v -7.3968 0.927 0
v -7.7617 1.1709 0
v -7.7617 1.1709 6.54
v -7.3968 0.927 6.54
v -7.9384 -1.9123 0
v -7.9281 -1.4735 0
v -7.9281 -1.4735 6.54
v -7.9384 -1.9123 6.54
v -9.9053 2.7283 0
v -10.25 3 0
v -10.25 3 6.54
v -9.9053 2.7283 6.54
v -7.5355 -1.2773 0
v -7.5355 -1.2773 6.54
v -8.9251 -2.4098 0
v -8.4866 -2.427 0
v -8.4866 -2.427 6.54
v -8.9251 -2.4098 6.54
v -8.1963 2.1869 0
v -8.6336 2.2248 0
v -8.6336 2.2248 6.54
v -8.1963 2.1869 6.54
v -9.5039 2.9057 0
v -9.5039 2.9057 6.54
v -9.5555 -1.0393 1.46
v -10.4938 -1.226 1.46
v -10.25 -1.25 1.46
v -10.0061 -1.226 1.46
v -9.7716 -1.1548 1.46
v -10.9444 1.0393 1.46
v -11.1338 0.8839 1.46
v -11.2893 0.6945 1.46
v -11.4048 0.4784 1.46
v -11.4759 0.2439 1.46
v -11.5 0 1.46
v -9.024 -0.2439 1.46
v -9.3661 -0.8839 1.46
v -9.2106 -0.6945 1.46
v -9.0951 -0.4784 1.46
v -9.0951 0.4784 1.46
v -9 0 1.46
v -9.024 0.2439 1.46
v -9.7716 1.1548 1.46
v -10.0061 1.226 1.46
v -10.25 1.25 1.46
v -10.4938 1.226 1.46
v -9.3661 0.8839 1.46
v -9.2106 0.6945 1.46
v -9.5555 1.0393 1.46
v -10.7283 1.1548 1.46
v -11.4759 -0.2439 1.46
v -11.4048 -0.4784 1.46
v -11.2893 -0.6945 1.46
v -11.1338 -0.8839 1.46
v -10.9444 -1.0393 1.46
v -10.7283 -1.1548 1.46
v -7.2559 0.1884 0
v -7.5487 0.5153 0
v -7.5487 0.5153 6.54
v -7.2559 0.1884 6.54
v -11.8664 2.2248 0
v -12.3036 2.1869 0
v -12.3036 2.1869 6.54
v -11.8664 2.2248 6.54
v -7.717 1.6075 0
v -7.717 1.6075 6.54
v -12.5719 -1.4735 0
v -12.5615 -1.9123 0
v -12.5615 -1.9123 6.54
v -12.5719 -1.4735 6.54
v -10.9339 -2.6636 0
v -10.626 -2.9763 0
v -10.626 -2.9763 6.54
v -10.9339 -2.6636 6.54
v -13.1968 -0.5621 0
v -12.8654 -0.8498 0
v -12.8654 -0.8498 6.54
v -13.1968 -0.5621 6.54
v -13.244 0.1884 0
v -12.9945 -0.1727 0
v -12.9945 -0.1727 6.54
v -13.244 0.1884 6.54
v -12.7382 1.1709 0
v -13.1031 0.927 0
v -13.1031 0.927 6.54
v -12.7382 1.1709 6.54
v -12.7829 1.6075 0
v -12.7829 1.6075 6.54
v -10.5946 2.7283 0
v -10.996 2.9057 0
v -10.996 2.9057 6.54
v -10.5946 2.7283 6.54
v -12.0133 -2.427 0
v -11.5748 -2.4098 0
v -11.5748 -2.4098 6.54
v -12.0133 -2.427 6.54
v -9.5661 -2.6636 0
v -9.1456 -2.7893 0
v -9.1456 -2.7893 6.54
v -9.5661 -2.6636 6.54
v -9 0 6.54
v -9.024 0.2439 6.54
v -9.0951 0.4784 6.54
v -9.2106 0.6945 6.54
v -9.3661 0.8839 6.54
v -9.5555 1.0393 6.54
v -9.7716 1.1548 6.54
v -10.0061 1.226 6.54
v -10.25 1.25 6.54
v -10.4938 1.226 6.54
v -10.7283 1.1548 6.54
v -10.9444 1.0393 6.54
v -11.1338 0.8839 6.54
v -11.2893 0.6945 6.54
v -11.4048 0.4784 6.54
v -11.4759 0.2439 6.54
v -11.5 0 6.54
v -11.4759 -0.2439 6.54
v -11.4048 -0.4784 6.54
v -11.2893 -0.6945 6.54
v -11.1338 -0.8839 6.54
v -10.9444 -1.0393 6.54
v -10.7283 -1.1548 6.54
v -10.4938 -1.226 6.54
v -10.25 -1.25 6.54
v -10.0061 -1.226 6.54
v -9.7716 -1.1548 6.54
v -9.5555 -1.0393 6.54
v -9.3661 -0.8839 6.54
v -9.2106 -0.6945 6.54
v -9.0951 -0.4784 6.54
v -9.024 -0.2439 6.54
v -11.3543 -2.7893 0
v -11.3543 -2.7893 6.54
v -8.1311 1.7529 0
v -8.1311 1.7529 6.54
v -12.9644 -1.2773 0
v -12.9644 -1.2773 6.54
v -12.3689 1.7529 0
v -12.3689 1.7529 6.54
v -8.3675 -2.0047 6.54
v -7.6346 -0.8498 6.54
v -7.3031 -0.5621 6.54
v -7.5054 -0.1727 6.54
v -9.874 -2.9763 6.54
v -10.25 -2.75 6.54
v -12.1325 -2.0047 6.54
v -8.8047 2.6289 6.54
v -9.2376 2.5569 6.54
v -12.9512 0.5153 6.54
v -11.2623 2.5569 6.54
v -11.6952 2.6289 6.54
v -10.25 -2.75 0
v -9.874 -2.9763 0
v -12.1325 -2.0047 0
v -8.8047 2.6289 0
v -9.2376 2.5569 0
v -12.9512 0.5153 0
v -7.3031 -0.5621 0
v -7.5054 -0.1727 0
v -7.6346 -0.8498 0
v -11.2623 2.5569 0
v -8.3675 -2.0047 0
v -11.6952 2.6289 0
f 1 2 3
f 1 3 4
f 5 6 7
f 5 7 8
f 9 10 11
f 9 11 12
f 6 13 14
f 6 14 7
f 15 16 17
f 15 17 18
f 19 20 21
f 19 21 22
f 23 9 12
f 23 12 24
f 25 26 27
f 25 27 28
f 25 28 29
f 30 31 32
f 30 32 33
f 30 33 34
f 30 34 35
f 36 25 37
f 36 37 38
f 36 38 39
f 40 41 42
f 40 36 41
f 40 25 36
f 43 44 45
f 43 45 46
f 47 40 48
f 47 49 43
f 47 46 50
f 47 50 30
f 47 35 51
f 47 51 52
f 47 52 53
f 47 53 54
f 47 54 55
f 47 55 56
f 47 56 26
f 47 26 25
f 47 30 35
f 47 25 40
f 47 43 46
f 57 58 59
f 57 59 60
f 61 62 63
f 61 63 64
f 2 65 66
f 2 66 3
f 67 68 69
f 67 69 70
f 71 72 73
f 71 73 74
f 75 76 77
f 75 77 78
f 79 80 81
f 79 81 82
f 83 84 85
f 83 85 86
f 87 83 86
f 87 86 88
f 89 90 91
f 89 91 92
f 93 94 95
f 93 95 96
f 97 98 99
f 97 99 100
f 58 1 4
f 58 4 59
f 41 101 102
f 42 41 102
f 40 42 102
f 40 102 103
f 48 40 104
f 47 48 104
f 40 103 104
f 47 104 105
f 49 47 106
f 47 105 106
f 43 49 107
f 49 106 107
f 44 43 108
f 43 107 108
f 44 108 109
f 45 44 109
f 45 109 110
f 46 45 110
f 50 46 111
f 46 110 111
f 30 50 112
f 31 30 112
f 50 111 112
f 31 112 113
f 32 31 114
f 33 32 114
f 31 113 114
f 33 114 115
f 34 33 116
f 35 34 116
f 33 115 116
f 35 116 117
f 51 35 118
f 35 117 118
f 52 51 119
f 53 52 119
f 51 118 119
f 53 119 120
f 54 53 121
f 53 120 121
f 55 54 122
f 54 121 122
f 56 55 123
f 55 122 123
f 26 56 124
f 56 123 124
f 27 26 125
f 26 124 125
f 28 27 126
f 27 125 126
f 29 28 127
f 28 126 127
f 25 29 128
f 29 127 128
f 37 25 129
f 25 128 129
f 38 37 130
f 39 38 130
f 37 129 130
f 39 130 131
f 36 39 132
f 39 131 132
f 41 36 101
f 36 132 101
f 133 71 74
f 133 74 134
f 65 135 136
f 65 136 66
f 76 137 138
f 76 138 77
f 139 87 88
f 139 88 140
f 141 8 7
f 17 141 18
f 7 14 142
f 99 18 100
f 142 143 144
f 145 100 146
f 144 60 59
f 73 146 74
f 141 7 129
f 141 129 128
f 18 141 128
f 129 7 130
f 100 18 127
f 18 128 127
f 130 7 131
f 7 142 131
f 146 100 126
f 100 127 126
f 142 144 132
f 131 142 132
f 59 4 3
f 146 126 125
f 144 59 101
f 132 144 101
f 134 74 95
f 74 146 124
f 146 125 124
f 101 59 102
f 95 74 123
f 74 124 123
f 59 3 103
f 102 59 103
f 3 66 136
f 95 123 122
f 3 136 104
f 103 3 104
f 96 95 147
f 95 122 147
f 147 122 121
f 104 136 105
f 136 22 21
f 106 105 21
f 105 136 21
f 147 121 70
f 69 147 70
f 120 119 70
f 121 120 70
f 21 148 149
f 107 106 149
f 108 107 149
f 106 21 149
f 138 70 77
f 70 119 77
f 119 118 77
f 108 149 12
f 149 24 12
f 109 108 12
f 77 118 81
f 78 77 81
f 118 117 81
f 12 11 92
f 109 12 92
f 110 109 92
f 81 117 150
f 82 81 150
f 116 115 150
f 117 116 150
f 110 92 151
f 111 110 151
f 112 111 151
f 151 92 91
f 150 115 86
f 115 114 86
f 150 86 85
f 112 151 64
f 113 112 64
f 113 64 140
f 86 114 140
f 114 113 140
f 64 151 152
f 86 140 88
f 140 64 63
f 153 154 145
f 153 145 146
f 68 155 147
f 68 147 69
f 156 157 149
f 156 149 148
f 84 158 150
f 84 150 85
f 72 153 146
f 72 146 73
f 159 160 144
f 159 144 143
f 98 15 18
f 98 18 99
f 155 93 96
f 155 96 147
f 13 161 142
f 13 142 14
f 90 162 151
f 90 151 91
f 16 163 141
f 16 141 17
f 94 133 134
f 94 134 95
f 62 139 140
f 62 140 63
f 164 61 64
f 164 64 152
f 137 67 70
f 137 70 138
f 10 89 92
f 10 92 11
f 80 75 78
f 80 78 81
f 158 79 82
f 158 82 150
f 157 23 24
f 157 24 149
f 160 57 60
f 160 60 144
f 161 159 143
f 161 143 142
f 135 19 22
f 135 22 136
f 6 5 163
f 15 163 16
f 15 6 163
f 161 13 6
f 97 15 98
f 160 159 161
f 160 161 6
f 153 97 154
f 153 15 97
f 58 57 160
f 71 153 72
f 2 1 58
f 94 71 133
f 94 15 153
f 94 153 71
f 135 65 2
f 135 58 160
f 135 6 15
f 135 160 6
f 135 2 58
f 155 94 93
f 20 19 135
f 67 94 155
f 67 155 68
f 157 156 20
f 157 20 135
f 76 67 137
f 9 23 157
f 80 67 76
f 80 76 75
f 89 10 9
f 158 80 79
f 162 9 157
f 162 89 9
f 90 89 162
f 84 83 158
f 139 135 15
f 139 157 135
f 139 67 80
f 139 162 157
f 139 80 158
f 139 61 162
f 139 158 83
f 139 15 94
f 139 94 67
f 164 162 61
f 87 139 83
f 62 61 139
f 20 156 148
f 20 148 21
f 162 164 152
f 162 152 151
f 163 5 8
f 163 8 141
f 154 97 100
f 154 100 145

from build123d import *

# Parameters (mm, degrees)
BOSS_EXTRUDE1_DEPTH = 6.539992
SKETCH2_R           = 1.25000004
CUT_EXTRUDE1_DEPTH  = 5.08


with BuildPart() as part:
    # Sketch1 → Boss-Extrude1 (new body)
    with BuildSketch(Plane.XY):
        Polygon((-10.594624819, 2.728309468), (-10.24995918, 2.999994), (-9.905293541, 2.728309468), (-9.503891011, 2.905743672), (-9.237618872, 2.55687975), (-8.804701048, 2.628914782), (-8.633553268, 2.224791874), (-8.196321969, 2.186901508), (-8.131052392, 1.752912142), (-7.716980469, 1.60747717), (-7.761690222, 1.170890494), (-7.396795337, 0.927049129), (-7.548675142, 0.515297489), (-7.255884983, 0.188371182), (-7.505391673, -0.172673551), (-7.303103322, -0.562142819), (-7.634559474, -0.849794878), (-7.535483452, -1.27733532), (-7.928062458, -1.473520467), (-7.938424075, -1.912268145), (-8.367458751, -2.004659346), (-8.48660695, -2.427046129), (-8.925139471, -2.409838105), (-9.145587731, -2.789323879), (-9.566063484, -2.663597874), (-9.873960231, -2.976338151), (-10.24995918, -2.749993992), (-10.625958129, -2.976338151), (-10.933854876, -2.663597874), (-11.354330629, -2.789323879), (-11.574778889, -2.409838105), (-12.01331141, -2.427046129), (-12.132459609, -2.004659346), (-12.561494285, -1.912268145), (-12.571855902, -1.473520467), (-12.964434908, -1.27733532), (-12.865358886, -0.849794878), (-13.196815038, -0.562142819), (-12.994526687, -0.172673551), (-13.244033377, 0.188371182), (-12.951243218, 0.515297489), (-13.103123023, 0.927049129), (-12.738228138, 1.170890494), (-12.782937891, 1.60747717), (-12.368865968, 1.752912142), (-12.303596391, 2.186901508), (-11.866365092, 2.224791874), (-11.695217312, 2.628914782), (-11.262299488, 2.55687975), (-10.996027349, 2.905743672), align=None)
    extrude(amount=BOSS_EXTRUDE1_DEPTH)

    # Sketch2 → Cut-Extrude1 (cut)
    with BuildSketch(Plane.XY.offset(6.539992)):
        with Locations((-10.24995918, 0)):
            Circle(SKETCH2_R)
    extrude(amount=-CUT_EXTRUDE1_DEPTH, mode=Mode.SUBTRACT)


solid = part.part
